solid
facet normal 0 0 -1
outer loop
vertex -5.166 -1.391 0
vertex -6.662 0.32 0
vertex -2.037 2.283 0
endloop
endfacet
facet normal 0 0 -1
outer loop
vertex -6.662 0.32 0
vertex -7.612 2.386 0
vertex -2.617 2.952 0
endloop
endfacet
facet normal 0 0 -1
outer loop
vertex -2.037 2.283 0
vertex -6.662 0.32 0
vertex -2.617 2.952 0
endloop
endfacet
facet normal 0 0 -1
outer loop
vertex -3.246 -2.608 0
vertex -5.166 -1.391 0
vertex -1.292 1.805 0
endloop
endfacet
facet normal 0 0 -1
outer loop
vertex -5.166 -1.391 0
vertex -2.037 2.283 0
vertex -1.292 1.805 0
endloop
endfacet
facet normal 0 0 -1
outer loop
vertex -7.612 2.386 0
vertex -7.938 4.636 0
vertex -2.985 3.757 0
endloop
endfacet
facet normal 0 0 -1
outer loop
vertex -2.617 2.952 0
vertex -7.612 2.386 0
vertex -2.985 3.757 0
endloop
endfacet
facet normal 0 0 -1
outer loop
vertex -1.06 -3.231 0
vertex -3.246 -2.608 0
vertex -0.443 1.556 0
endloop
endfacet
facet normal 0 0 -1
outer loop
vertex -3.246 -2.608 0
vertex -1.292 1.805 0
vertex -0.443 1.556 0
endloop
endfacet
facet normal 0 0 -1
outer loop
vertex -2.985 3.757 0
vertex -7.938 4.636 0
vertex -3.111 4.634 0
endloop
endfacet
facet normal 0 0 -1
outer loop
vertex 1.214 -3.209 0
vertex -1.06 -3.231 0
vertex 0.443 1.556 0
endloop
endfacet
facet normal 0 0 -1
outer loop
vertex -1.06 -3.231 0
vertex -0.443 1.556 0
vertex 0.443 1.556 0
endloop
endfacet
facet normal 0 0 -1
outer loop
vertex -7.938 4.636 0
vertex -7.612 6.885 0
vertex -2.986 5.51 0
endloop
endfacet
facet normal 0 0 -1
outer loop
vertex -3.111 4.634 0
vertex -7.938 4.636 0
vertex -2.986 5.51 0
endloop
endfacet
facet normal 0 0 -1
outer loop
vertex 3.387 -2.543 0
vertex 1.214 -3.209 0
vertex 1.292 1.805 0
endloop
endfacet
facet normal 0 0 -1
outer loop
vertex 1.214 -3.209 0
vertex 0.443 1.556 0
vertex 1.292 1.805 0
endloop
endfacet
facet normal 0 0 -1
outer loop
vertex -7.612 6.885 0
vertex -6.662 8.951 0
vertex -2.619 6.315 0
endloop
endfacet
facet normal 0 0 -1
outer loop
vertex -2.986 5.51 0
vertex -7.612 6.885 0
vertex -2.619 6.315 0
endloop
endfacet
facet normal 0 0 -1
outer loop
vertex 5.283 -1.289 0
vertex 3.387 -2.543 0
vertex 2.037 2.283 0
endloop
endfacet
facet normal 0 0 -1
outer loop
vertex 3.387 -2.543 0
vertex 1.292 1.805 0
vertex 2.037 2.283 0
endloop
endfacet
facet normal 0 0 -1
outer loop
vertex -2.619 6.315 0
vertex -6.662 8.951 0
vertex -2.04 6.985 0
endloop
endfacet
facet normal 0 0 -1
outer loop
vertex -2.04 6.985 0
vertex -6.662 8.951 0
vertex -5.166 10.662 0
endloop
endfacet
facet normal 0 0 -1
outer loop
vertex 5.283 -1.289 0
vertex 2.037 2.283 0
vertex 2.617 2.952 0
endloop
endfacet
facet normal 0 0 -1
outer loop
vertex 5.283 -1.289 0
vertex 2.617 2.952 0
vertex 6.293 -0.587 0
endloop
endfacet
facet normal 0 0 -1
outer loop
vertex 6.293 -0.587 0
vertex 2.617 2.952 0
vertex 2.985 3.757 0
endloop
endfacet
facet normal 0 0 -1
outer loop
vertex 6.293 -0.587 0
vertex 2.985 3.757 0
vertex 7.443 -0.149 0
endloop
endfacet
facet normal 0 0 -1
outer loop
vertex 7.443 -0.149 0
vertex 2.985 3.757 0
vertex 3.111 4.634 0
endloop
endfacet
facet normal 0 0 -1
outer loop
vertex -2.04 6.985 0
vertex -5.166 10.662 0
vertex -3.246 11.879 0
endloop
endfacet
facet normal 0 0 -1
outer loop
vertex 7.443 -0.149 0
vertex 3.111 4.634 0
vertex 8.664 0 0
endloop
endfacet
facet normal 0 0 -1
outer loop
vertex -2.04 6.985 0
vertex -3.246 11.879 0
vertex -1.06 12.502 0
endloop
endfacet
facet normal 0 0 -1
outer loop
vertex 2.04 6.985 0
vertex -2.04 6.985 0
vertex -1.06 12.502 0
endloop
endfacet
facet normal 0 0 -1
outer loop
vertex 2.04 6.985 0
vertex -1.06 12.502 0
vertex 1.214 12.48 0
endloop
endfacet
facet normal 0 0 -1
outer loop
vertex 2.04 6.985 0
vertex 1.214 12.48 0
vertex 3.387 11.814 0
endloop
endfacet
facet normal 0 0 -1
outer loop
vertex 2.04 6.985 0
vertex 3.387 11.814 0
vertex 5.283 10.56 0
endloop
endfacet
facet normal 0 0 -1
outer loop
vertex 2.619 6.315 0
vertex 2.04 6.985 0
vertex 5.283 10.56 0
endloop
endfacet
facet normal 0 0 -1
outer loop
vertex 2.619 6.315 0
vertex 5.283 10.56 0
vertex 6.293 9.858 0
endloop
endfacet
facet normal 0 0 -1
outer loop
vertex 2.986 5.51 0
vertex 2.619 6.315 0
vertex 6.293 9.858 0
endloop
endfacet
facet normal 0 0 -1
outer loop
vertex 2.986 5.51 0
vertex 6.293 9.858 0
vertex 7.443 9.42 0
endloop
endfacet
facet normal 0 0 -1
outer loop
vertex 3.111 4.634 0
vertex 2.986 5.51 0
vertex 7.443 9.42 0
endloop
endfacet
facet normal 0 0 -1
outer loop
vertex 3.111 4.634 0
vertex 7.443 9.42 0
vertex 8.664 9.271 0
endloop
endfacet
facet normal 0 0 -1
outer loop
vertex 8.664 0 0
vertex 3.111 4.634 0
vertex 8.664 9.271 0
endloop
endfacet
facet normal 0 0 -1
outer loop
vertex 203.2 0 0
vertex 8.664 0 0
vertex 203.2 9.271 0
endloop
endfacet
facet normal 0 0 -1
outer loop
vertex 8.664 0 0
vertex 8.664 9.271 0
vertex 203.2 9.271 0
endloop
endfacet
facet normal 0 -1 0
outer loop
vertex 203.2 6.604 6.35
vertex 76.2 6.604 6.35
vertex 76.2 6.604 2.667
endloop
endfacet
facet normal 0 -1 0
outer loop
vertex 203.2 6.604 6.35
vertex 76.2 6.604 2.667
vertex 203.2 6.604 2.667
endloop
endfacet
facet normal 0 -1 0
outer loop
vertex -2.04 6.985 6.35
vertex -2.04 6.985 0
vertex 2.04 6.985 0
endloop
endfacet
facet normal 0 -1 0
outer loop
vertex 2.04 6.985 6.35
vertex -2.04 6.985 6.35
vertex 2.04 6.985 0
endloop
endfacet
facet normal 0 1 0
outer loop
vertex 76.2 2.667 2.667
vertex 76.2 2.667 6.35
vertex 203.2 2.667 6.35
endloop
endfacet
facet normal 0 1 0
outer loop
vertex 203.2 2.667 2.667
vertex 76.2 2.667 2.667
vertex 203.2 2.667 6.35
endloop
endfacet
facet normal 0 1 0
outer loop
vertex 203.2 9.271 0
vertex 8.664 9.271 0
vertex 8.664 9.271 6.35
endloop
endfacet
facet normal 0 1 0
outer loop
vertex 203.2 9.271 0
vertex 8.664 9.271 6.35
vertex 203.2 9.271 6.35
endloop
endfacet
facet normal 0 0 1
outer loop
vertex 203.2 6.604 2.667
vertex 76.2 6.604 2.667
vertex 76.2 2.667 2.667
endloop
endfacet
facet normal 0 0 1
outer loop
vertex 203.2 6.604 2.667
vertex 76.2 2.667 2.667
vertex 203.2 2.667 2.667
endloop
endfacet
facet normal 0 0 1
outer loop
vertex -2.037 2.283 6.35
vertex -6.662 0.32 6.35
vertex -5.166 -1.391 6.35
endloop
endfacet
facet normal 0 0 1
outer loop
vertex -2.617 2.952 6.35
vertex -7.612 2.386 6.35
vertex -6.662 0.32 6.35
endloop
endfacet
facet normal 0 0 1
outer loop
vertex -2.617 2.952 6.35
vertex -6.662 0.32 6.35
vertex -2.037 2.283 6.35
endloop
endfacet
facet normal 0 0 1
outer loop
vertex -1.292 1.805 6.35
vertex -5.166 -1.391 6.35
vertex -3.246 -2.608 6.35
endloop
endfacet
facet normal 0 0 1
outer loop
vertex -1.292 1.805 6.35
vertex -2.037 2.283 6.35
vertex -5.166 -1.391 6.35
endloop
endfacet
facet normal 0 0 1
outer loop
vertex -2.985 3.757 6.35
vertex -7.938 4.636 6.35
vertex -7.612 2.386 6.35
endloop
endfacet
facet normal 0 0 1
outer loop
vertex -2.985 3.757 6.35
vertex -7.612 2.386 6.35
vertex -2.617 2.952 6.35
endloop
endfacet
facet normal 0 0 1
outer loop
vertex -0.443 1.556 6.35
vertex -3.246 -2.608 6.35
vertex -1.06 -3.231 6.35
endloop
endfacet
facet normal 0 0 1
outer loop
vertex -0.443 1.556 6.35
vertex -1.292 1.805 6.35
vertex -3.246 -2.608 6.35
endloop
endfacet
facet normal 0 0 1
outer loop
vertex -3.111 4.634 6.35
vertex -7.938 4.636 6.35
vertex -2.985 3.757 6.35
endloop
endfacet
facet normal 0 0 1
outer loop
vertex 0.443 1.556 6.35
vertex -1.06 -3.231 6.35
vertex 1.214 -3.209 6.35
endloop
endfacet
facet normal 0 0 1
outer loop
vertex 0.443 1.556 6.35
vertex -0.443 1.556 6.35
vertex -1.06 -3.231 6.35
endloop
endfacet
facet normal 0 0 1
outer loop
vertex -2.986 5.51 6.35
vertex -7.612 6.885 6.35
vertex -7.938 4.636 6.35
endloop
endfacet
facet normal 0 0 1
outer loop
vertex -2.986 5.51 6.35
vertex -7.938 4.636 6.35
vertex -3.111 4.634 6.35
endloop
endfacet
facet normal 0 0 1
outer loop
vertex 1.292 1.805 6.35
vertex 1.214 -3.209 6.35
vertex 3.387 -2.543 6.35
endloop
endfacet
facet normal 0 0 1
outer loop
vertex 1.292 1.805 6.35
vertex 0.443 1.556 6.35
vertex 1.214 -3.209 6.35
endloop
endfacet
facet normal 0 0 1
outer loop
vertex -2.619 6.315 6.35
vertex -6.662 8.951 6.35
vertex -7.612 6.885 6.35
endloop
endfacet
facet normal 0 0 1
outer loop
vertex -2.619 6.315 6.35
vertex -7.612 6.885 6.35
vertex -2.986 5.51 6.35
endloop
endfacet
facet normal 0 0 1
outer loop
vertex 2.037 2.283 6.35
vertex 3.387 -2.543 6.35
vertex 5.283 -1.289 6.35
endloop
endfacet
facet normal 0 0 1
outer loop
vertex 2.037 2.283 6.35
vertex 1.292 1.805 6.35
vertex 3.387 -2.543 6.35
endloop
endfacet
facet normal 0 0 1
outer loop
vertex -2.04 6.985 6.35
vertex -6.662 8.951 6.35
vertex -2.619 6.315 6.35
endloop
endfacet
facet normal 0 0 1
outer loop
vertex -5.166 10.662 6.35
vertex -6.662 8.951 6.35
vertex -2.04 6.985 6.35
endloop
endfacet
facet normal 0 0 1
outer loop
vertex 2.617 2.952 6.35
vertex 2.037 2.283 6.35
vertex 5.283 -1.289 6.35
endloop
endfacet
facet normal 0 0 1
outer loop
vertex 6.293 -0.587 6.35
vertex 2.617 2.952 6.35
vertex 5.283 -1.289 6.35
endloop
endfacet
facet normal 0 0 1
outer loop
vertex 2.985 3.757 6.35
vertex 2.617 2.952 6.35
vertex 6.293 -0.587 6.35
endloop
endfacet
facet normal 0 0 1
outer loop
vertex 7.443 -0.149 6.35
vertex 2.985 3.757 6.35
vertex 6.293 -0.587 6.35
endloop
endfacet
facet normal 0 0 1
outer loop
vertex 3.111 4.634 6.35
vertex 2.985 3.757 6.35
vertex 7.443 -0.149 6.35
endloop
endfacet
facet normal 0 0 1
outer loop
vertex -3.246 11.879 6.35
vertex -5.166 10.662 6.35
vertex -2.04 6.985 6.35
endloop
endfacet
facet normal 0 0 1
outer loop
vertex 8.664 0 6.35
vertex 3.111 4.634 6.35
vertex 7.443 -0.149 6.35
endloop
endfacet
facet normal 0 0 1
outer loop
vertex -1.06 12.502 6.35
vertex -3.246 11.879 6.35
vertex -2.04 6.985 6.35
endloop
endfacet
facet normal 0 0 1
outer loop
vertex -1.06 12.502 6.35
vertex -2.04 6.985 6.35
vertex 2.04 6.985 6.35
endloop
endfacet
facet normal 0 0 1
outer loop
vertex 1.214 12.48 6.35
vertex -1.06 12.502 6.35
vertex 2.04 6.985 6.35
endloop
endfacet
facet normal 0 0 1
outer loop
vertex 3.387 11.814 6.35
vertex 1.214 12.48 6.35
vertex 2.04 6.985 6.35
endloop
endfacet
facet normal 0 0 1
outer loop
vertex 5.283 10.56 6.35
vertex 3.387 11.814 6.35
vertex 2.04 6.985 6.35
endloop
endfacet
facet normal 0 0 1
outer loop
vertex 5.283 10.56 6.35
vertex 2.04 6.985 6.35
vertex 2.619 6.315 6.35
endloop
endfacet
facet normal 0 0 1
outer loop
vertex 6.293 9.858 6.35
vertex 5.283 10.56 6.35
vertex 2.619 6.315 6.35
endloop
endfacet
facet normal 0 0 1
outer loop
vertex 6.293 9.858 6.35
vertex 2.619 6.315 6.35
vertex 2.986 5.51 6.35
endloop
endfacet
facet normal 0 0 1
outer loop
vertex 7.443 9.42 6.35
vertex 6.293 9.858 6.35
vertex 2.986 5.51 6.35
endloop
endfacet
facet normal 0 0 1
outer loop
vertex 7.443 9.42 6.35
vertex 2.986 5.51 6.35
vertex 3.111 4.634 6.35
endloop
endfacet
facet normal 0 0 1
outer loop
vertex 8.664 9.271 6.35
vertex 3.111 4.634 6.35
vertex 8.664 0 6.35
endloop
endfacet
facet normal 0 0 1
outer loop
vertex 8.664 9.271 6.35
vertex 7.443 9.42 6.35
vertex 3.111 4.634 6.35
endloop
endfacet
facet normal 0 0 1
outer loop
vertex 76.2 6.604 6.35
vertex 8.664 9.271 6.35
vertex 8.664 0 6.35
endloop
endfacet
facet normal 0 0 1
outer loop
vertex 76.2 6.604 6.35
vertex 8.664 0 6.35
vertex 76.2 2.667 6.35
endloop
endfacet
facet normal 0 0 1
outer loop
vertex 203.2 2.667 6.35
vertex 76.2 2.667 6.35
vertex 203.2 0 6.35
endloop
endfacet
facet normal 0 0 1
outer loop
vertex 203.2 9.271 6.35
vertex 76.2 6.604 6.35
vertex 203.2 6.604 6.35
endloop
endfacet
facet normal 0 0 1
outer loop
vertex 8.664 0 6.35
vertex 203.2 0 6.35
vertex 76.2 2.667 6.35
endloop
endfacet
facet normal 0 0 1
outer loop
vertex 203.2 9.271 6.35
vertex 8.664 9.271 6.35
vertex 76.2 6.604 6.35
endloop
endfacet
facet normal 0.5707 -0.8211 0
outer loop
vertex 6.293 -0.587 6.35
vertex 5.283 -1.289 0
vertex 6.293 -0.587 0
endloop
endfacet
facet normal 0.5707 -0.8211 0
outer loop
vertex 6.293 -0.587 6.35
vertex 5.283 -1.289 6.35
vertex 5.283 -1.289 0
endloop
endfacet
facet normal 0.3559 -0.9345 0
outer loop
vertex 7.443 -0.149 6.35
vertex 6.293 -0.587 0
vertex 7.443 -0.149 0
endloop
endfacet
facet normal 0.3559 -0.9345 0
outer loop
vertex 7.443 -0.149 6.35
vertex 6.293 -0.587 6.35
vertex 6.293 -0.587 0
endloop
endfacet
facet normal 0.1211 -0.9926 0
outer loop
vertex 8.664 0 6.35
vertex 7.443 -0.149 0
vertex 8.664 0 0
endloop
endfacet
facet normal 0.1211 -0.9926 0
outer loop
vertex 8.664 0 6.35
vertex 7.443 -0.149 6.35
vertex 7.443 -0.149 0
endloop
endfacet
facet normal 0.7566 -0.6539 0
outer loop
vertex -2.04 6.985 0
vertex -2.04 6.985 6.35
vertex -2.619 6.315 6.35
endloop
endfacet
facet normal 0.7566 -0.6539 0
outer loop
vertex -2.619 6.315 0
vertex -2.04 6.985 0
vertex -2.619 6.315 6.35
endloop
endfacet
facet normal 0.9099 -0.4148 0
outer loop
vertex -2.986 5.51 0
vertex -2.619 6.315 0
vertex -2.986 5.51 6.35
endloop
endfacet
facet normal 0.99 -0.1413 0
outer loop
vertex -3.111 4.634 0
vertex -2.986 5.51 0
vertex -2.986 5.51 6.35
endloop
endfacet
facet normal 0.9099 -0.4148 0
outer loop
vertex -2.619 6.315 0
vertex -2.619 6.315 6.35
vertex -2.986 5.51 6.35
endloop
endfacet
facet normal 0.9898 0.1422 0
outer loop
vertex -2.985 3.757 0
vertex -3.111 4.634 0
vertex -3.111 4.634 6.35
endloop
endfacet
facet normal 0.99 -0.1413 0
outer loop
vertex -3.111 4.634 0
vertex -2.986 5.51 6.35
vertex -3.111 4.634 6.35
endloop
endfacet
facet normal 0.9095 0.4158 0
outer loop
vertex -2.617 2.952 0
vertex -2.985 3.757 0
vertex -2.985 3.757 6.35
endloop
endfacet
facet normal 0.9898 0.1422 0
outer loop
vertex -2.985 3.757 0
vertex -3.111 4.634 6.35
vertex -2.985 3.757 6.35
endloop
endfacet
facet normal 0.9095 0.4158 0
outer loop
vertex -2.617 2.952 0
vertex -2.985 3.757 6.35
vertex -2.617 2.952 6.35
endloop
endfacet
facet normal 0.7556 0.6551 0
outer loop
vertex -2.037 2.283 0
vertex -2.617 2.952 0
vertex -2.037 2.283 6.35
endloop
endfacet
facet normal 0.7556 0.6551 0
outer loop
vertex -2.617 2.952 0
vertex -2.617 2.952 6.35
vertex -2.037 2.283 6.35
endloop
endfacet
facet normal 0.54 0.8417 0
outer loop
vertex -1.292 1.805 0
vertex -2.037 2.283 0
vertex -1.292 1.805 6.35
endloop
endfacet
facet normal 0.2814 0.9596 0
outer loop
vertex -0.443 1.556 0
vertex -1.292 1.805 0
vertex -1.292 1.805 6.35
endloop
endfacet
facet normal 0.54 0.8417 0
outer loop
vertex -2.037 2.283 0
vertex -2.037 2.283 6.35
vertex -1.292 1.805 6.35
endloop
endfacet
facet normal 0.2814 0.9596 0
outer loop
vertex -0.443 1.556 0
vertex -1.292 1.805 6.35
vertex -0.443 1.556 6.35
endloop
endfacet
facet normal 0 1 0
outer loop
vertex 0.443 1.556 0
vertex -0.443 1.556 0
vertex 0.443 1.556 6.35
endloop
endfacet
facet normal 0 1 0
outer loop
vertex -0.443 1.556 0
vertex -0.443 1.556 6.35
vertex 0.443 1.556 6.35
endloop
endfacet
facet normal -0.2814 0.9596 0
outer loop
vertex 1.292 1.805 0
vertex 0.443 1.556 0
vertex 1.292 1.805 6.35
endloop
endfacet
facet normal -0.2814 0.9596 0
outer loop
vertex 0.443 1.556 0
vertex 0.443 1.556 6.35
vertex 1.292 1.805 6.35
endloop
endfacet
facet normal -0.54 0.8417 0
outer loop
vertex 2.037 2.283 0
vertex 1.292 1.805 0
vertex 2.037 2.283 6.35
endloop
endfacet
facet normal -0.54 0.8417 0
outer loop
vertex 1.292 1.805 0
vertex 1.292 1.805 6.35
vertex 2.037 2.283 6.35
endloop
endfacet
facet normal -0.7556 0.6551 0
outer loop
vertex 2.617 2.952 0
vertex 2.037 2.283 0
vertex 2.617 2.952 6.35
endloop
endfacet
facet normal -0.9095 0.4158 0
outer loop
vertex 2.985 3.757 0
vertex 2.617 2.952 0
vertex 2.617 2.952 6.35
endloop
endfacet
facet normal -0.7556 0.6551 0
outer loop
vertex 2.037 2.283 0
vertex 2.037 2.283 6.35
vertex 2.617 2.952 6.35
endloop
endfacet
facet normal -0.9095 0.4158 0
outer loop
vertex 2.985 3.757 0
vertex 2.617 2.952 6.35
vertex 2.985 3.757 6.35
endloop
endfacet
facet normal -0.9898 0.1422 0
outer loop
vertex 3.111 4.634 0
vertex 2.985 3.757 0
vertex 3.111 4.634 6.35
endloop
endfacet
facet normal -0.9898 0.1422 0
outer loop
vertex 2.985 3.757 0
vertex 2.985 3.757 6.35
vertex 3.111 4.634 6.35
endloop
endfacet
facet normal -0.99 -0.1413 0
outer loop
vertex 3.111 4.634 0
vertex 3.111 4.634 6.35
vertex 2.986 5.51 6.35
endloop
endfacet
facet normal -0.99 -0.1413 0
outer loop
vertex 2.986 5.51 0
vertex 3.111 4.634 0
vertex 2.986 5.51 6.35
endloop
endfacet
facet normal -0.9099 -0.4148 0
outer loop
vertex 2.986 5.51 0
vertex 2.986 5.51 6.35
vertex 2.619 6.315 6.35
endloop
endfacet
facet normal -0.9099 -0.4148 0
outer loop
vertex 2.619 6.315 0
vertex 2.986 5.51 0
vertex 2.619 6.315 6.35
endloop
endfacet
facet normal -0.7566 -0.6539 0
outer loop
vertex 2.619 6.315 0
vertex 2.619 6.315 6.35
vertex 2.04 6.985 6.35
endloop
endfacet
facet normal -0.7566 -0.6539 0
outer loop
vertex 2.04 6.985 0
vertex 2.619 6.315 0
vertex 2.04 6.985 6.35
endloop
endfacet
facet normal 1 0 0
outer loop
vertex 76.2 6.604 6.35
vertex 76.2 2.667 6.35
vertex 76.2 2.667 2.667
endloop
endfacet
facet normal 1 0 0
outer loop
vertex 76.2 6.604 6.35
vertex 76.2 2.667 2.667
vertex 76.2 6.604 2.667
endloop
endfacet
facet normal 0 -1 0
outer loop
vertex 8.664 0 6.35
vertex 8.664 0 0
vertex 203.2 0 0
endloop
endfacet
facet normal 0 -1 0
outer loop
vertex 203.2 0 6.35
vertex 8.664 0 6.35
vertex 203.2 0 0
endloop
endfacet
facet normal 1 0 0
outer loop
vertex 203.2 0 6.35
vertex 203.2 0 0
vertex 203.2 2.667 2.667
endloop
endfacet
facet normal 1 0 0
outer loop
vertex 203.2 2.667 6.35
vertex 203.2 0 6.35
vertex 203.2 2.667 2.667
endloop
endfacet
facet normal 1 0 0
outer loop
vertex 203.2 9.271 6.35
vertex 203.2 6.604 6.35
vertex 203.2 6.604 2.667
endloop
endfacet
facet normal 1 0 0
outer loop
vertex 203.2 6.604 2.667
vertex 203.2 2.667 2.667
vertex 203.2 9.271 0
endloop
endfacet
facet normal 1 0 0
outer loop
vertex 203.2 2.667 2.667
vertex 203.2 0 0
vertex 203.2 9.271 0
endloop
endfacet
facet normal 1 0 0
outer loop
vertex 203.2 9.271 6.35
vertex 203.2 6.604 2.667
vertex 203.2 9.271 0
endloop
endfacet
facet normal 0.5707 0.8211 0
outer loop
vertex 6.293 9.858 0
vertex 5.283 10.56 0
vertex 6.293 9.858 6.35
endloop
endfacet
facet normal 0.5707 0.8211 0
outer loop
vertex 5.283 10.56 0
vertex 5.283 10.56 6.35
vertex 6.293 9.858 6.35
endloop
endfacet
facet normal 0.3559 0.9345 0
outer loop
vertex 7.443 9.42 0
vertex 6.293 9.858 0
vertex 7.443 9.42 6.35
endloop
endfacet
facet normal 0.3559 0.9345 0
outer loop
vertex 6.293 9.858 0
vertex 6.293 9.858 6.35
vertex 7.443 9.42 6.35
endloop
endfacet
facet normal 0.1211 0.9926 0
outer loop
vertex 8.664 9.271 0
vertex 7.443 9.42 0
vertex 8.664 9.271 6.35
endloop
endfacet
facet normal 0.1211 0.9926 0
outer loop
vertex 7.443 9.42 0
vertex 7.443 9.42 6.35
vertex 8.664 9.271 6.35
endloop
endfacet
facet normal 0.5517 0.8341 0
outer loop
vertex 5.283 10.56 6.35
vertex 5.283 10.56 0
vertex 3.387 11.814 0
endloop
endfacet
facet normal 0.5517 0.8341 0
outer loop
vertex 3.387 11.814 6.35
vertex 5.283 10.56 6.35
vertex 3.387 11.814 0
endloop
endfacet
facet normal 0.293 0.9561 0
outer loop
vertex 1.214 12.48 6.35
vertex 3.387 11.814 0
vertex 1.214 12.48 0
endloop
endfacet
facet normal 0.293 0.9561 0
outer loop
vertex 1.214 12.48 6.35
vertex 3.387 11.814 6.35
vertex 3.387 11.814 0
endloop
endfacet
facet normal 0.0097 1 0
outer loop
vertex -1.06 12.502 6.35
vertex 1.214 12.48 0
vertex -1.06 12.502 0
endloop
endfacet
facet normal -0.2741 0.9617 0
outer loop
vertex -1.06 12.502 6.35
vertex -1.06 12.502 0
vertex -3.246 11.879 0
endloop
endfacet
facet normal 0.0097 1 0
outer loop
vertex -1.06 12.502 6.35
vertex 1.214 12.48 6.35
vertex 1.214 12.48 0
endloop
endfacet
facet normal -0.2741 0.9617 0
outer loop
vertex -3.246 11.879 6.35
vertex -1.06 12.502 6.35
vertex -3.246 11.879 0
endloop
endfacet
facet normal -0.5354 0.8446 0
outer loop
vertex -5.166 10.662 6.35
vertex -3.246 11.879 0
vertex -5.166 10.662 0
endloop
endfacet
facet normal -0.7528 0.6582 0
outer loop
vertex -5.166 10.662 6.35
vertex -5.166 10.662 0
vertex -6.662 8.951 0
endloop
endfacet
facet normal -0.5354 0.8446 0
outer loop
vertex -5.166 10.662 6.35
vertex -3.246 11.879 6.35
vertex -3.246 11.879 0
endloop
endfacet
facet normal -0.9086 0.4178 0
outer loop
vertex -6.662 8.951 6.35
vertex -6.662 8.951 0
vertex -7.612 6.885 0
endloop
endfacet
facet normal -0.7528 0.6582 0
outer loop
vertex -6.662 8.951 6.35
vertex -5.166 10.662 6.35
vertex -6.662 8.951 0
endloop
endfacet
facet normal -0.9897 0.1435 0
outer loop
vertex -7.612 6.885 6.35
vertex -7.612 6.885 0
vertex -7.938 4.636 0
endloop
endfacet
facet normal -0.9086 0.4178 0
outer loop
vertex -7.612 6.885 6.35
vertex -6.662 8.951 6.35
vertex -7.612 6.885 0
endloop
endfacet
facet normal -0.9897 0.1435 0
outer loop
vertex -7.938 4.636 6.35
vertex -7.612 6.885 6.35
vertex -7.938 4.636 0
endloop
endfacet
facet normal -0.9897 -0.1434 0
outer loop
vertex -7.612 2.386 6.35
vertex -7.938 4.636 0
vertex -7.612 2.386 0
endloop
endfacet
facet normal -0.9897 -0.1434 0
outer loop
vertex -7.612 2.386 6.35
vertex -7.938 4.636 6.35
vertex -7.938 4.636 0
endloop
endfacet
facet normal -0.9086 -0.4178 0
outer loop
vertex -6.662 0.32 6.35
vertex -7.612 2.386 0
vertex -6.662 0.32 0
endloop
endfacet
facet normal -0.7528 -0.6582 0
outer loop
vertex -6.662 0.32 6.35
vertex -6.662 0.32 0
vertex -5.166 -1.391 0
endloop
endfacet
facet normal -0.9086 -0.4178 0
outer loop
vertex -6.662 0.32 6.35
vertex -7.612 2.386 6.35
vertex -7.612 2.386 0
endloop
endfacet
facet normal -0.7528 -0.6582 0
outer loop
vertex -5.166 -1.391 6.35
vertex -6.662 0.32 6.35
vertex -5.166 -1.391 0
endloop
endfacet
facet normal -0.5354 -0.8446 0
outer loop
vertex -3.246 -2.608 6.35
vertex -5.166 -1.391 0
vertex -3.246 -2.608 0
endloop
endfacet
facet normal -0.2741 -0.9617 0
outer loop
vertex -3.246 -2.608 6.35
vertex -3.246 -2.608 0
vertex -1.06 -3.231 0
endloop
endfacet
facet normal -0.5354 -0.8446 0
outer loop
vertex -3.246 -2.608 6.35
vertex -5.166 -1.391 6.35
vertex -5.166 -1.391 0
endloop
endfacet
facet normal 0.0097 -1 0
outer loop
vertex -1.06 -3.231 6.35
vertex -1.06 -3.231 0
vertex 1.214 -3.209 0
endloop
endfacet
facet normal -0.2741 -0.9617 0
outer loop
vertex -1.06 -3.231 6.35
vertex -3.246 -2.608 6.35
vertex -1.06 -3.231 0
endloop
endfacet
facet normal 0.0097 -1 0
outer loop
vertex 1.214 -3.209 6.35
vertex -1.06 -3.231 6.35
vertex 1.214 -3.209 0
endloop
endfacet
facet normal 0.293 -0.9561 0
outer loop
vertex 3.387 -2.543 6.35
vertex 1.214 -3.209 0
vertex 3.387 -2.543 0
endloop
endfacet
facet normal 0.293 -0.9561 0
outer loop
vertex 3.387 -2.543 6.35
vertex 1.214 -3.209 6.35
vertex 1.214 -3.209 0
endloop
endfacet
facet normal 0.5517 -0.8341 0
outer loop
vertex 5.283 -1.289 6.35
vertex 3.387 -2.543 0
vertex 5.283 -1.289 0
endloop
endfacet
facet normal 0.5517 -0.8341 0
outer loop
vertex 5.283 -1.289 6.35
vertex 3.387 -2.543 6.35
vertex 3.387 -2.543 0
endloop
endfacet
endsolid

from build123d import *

# Parameters (mm, degrees)
F0_W      = 203.2
F0_H      = 9.271
F1_DEPTH  = 6.35
F2_W      = 127
F2_H      = 3.937
F3_DEPTH  = 3.683
F4_R      = 7.9375
F5_DEPTH  = 6.35
F6_R      = 5.08
F7_R      = 3.1115
F8_DEPTH  = 6.351
F9_W      = 9.525
F9_H      = 3.175
F10_DEPTH = 6.35


with BuildPart() as f1:
    # F0 (on Top) → F1 (new body)
    with BuildSketch(Plane.XY):
        with Locations((101.6, 4.6355)):
            Rectangle(F0_W, F0_H)
    extrude(amount=F1_DEPTH)

    # F2 (on face) → F3 (cut)
    with BuildSketch(Plane.XY.offset(6.35)):
        with Locations((139.7, 4.6355)):
            Rectangle(F2_W, F2_H)
    extrude(amount=-F3_DEPTH, mode=Mode.SUBTRACT)

    # F4 (on face) → F5 (join, through all)
    with BuildSketch(Plane.XY.offset(6.35)):
        with Locations((0, 4.6355)):
            Circle(F4_R)
    extrude(amount=-F5_DEPTH)

    # F6
    f6_edges = [f1.edges().sort_by_distance(p)[0] for p in [
        (6.443295, 9.271, 3.175),
        (6.443295, 0, 3.175),
    ]]
    fillet(f6_edges, radius=F6_R)

    # F7 (on face) → F8 (cut, through all)
    with BuildSketch(Plane.XY.offset(6.35)):
        with Locations((0, 4.6355)):
            Circle(F7_R)
    extrude(amount=-F8_DEPTH, mode=Mode.SUBTRACT)

    # F9 (on face) → F10 (join, through all)
    with BuildSketch(Plane.XY.offset(6.35)):
        with Locations((0.377471, 8.5725)):
            Rectangle(F9_W, F9_H)
    extrude(amount=-F10_DEPTH)


solid = f1.part
